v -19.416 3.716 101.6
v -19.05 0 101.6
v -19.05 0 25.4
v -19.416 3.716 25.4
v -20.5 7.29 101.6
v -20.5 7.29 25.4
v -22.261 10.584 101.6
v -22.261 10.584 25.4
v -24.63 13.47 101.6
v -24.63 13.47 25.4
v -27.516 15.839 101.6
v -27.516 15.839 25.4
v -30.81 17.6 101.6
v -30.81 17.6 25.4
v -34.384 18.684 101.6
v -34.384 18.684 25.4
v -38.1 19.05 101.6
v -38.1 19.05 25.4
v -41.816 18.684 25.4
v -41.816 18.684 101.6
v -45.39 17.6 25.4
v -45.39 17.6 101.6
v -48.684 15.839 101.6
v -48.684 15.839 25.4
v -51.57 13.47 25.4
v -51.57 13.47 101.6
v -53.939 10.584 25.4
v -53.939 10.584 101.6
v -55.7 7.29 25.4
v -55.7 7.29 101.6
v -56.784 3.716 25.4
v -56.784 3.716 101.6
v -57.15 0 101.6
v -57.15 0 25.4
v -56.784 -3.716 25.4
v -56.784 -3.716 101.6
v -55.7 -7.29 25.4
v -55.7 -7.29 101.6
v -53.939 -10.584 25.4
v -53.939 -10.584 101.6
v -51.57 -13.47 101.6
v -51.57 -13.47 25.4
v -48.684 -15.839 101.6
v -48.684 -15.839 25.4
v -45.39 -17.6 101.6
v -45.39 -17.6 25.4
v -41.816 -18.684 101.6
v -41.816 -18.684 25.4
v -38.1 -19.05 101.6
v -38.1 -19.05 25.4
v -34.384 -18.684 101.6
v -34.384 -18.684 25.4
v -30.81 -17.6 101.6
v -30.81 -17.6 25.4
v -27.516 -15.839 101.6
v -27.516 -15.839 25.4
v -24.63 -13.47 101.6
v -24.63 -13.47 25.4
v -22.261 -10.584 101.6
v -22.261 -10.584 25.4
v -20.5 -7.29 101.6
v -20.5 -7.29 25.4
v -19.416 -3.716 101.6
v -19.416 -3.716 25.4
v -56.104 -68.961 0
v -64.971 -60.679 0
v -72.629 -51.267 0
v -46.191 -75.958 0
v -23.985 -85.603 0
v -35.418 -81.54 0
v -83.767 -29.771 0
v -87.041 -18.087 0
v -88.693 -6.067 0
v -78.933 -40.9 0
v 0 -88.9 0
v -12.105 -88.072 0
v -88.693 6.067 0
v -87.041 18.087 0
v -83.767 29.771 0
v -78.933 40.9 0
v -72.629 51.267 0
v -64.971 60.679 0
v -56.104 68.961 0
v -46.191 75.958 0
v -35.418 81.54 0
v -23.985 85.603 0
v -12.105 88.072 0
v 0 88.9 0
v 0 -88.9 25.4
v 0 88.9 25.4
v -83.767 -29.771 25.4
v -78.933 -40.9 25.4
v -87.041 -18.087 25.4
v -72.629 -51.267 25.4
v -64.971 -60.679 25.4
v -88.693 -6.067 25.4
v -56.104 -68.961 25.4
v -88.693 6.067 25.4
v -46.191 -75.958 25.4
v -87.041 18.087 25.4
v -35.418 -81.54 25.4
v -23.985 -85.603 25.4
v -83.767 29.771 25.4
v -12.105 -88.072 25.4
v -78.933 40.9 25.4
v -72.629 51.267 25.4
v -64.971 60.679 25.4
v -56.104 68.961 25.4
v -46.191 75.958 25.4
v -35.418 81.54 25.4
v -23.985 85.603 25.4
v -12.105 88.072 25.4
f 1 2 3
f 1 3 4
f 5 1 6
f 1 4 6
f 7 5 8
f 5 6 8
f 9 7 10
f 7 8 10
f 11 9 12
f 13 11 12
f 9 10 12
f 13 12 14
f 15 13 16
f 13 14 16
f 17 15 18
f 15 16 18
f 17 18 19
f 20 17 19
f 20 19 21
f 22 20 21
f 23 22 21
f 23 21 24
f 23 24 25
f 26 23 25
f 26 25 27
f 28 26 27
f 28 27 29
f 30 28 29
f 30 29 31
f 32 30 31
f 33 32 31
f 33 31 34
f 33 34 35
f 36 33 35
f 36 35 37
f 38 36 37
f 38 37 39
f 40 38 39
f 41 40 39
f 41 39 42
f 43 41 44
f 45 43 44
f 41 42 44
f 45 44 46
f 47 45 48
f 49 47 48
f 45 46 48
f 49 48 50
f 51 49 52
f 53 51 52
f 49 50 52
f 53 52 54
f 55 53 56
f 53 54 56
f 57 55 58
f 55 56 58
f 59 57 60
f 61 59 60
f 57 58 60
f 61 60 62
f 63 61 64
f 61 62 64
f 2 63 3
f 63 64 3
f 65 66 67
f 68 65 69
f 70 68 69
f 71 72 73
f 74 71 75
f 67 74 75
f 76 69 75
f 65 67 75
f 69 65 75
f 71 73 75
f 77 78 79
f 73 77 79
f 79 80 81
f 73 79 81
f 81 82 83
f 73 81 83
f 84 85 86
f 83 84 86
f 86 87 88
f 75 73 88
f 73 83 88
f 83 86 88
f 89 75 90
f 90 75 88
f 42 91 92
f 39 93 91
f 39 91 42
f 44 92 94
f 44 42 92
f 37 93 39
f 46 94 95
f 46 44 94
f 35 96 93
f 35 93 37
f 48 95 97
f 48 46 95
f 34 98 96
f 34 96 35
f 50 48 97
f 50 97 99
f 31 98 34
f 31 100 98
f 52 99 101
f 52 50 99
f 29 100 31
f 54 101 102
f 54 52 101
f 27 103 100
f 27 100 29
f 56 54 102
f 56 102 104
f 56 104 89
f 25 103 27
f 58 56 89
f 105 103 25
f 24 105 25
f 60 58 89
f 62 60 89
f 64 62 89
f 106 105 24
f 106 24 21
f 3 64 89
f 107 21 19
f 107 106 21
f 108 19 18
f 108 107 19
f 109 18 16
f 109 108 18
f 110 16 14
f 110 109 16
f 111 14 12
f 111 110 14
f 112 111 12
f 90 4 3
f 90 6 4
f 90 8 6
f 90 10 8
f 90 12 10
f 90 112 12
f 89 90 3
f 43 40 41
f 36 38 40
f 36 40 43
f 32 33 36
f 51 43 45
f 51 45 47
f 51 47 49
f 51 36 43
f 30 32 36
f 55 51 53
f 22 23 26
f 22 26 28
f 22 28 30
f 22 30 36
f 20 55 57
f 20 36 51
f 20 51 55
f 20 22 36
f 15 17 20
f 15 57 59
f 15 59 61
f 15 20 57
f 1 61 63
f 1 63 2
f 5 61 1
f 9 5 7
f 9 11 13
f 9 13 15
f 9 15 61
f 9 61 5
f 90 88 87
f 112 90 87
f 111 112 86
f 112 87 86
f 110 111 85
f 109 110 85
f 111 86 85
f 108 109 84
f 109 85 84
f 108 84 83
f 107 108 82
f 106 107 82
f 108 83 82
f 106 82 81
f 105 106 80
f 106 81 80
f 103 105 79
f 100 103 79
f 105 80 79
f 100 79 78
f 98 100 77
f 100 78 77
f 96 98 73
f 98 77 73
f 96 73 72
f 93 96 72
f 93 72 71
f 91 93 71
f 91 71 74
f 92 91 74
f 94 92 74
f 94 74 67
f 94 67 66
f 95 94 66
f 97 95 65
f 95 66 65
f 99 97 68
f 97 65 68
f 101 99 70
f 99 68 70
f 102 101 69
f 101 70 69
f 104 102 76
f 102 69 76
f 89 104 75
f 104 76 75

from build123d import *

# Parameters (mm, degrees)
F0_R     = 19.05
F1_DEPTH = 101.6
F2_DEPTH = 25.4
F3_DEPTH = 76.2


with BuildPart() as f1:
    # F0 (on Top) → F1 (new body)
    with BuildSketch(Plane.XY):
        with Locations((-38.1, 0)):
            Circle(F0_R)
    extrude(amount=F1_DEPTH)

    # F0 (on Top) → F2 (join)
    with BuildSketch(Plane.XY):
        with BuildLine():
            Line((0, -88.9), (0, 88.9))
            ThreePointArc((0, 88.9), (-88.9, 0), (0, -88.9))
        make_face()
        with Locations((-38.1, 0)):
            Circle(F0_R, mode=Mode.SUBTRACT)
    extrude(amount=F2_DEPTH)

    # F3 (cut): a face of the model
    f3_faces = [f1.faces().sort_by_distance(p)[0] for p in [
        (-38.1, 0, 101.6),
    ]]
    extrude(f3_faces, amount=F3_DEPTH, mode=Mode.SUBTRACT)


solid = f1.part
